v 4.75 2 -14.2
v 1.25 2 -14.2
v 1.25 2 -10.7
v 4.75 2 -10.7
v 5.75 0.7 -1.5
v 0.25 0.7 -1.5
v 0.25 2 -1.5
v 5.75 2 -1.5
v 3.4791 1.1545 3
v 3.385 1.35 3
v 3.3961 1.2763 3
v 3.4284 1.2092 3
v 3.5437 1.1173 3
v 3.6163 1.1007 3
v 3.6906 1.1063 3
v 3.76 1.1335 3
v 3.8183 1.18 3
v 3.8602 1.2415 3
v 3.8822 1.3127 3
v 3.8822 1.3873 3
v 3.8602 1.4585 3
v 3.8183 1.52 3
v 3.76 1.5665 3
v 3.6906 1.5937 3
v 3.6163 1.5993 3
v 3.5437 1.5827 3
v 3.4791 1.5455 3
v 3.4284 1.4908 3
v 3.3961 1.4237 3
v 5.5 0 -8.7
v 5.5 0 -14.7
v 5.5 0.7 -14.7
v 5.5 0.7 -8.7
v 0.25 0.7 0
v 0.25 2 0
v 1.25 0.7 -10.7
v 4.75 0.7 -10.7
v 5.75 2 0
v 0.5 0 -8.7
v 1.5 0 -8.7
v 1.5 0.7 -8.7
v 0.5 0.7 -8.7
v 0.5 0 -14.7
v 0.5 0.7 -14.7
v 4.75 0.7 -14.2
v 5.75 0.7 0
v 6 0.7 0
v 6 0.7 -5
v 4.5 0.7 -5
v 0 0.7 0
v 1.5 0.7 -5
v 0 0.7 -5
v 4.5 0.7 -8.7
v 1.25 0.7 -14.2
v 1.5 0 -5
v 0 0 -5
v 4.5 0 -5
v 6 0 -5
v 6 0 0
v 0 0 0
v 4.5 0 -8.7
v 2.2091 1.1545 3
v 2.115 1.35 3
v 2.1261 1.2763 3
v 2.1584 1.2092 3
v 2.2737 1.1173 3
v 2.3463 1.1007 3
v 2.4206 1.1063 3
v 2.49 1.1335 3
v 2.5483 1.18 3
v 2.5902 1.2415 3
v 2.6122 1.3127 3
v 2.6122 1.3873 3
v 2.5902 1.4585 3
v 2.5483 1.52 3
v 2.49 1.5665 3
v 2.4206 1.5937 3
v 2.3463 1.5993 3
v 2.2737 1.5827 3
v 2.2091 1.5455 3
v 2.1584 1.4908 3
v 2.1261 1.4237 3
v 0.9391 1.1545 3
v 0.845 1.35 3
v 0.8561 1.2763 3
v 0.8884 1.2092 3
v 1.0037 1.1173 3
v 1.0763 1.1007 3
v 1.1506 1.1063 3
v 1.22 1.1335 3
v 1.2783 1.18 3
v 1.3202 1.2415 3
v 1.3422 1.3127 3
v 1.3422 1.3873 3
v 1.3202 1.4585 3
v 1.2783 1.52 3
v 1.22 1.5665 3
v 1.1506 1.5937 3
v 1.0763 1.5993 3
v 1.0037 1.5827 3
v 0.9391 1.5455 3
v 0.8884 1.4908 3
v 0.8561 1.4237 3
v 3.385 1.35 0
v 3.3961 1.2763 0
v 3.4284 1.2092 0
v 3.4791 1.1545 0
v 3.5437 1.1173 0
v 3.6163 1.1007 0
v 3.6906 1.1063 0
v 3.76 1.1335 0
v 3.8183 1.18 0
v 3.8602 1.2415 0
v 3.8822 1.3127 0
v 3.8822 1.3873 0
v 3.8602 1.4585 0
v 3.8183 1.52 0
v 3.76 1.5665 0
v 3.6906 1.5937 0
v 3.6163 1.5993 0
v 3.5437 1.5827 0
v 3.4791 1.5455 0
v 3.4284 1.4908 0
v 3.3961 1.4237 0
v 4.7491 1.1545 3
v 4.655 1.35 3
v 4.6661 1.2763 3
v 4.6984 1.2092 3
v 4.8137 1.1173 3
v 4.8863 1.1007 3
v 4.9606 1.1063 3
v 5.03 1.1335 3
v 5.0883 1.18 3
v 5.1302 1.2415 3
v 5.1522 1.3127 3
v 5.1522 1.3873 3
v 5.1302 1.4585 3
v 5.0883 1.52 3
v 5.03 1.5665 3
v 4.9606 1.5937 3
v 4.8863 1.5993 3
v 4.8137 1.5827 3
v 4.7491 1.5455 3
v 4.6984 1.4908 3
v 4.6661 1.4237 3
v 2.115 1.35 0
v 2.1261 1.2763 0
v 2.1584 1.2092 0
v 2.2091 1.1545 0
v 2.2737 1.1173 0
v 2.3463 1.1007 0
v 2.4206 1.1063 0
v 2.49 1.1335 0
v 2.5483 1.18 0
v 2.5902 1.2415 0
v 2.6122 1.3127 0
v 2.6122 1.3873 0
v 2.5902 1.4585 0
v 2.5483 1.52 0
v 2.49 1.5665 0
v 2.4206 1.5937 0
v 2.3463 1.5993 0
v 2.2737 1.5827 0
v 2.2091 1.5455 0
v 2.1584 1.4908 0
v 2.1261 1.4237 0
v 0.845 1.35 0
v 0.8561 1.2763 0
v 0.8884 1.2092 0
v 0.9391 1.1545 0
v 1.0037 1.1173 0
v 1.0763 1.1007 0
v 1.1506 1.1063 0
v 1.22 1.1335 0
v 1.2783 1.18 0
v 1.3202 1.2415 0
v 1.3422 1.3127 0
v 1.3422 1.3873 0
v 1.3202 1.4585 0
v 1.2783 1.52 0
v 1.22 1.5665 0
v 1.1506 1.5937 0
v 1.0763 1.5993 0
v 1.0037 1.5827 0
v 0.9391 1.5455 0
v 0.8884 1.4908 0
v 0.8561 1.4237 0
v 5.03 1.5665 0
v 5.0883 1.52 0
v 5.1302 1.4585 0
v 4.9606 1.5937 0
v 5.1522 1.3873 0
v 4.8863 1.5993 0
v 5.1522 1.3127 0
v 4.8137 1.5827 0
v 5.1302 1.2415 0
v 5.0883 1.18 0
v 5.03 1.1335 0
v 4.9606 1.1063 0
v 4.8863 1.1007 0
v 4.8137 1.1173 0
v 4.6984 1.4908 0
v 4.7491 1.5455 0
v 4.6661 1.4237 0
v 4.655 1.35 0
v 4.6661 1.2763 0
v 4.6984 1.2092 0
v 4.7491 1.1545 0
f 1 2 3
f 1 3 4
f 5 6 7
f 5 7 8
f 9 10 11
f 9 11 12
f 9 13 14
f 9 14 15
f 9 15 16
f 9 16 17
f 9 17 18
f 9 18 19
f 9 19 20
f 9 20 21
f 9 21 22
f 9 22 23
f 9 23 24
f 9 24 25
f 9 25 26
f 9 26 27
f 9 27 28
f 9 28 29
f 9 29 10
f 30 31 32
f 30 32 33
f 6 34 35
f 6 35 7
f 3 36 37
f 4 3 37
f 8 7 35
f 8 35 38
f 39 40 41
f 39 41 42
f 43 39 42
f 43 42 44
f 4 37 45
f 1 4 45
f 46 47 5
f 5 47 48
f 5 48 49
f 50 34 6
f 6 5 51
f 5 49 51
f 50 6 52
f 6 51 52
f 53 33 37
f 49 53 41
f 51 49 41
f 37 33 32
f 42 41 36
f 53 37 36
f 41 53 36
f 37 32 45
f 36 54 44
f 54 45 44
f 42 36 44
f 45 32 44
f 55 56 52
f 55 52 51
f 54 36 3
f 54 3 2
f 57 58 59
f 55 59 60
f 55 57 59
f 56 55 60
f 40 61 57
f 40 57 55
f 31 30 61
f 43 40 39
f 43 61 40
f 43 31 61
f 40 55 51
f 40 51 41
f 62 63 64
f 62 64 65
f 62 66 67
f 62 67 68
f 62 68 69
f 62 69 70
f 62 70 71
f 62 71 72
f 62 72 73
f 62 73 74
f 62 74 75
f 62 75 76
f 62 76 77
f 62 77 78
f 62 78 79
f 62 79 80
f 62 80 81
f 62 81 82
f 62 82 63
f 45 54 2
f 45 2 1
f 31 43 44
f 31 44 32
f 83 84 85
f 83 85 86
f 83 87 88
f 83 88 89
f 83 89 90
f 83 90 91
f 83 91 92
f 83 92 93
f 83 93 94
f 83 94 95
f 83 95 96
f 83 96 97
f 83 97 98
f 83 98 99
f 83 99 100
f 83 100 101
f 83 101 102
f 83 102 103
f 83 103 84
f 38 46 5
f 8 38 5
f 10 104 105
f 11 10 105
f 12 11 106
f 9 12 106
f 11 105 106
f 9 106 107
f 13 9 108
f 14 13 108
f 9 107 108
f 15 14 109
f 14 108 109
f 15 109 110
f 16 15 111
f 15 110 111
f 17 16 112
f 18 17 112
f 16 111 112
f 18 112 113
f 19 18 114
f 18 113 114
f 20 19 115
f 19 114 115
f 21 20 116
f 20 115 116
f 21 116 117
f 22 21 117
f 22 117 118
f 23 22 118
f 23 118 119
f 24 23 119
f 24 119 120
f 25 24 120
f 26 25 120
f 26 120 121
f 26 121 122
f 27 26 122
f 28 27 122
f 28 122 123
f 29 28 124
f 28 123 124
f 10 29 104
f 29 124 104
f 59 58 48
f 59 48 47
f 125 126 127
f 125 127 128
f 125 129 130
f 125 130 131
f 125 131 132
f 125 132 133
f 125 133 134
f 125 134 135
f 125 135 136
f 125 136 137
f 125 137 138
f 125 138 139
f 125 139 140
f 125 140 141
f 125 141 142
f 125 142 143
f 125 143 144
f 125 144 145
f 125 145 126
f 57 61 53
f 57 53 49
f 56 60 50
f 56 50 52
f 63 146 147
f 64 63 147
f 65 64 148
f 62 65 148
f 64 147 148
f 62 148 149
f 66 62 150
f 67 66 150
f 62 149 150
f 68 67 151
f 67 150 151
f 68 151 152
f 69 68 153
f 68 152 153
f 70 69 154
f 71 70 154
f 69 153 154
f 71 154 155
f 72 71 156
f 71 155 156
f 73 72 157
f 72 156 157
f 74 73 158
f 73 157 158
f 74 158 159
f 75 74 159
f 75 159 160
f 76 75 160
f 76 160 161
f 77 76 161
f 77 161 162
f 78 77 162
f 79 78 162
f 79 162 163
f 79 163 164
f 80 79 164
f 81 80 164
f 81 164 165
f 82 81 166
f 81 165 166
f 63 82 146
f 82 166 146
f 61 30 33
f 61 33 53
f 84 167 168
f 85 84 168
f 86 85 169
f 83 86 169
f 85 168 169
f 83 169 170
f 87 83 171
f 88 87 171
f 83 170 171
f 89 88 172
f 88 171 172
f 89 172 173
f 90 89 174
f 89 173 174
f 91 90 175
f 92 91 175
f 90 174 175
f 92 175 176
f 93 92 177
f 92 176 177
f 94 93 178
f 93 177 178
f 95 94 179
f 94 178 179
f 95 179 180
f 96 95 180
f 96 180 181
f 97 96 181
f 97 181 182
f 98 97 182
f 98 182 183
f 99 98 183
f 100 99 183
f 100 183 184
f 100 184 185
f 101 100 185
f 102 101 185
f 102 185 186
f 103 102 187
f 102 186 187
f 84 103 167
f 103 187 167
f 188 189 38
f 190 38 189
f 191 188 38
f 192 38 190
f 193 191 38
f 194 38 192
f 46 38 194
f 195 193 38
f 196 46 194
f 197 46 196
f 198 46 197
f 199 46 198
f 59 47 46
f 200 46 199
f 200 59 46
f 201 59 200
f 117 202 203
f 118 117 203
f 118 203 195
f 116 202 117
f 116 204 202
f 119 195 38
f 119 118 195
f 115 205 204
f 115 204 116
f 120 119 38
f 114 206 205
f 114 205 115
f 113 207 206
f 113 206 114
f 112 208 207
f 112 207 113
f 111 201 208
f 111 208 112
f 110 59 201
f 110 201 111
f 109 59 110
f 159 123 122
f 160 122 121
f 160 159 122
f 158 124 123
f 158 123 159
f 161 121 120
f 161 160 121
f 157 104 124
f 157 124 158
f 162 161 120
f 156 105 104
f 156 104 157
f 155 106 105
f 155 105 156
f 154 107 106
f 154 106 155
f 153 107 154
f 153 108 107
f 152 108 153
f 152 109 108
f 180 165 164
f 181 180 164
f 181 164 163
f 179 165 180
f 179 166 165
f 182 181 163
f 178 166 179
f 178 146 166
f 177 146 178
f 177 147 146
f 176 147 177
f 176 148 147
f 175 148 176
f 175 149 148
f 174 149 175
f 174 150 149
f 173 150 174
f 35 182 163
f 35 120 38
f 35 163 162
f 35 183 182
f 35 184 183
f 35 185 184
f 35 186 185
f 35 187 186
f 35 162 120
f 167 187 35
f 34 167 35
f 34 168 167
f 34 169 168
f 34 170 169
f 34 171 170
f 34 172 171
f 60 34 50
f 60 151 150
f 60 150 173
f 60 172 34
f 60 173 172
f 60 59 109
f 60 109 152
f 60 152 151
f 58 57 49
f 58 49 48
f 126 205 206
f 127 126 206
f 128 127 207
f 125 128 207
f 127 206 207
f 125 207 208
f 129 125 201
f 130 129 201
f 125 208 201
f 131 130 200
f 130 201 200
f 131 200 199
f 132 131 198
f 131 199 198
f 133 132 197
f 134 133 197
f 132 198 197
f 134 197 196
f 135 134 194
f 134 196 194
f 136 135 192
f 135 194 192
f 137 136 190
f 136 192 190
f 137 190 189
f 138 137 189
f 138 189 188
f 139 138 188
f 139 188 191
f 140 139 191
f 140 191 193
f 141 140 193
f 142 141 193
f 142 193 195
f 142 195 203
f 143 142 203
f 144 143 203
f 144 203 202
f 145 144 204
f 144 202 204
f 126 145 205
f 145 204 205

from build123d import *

# Parameters (mm, degrees)
BOSS_EXTRUDE1_DEPTH = 0.7
SKETCH2_W           = 3.5
SKETCH2_H           = 3.5
SKETCH2_W_2         = 5.5
SKETCH2_H_2         = 1.5
BOSS_EXTRUDE2_DEPTH = 1.3
SKETCH3_R           = 0.25
BOSS_EXTRUDE3_DEPTH = 3


with BuildPart() as part:
    # Sketch1 → Boss-Extrude1 (new body)
    with BuildSketch(Plane(origin=(0, 0, 0), x_dir=(1, 0, 0), z_dir=(0, 1, 0))):
        Polygon((0, 0), (0, 5), (1.5, 5), (1.5, 8.7), (0.5, 8.7), (0.5, 14.7), (5.5, 14.7), (5.5, 8.7), (4.5, 8.7), (4.5, 5), (6, 5), (6, 0), align=None)
    extrude(amount=BOSS_EXTRUDE1_DEPTH)

    # Sketch2 → Boss-Extrude2 (add)
    with BuildSketch(Plane(origin=(0, 0.7, 0), x_dir=(1, 0, 0), z_dir=(0, 1, 0))):
        with Locations((3, 12.45)):
            Rectangle(SKETCH2_W, SKETCH2_H)
        with Locations((3, 0.75)):
            Rectangle(SKETCH2_W_2, SKETCH2_H_2)
    extrude(amount=BOSS_EXTRUDE2_DEPTH)

    # Sketch3 → Boss-Extrude3 (add)
    with BuildSketch(Plane.XY):
        with Locations(Location((1.095, 1.35, 0), (0, 0, 180))):
            Circle(SKETCH3_R)
        with Locations(Location((2.365, 1.35, 0), (0, 0, 180))):
            Circle(SKETCH3_R)
        with Locations(Location((3.635, 1.35, 0), (0, 0, 180))):
            Circle(SKETCH3_R)
        with Locations(Location((4.905, 1.35, 0), (0, 0, 180))):
            Circle(SKETCH3_R)
    extrude(amount=BOSS_EXTRUDE3_DEPTH)


solid = part.part
